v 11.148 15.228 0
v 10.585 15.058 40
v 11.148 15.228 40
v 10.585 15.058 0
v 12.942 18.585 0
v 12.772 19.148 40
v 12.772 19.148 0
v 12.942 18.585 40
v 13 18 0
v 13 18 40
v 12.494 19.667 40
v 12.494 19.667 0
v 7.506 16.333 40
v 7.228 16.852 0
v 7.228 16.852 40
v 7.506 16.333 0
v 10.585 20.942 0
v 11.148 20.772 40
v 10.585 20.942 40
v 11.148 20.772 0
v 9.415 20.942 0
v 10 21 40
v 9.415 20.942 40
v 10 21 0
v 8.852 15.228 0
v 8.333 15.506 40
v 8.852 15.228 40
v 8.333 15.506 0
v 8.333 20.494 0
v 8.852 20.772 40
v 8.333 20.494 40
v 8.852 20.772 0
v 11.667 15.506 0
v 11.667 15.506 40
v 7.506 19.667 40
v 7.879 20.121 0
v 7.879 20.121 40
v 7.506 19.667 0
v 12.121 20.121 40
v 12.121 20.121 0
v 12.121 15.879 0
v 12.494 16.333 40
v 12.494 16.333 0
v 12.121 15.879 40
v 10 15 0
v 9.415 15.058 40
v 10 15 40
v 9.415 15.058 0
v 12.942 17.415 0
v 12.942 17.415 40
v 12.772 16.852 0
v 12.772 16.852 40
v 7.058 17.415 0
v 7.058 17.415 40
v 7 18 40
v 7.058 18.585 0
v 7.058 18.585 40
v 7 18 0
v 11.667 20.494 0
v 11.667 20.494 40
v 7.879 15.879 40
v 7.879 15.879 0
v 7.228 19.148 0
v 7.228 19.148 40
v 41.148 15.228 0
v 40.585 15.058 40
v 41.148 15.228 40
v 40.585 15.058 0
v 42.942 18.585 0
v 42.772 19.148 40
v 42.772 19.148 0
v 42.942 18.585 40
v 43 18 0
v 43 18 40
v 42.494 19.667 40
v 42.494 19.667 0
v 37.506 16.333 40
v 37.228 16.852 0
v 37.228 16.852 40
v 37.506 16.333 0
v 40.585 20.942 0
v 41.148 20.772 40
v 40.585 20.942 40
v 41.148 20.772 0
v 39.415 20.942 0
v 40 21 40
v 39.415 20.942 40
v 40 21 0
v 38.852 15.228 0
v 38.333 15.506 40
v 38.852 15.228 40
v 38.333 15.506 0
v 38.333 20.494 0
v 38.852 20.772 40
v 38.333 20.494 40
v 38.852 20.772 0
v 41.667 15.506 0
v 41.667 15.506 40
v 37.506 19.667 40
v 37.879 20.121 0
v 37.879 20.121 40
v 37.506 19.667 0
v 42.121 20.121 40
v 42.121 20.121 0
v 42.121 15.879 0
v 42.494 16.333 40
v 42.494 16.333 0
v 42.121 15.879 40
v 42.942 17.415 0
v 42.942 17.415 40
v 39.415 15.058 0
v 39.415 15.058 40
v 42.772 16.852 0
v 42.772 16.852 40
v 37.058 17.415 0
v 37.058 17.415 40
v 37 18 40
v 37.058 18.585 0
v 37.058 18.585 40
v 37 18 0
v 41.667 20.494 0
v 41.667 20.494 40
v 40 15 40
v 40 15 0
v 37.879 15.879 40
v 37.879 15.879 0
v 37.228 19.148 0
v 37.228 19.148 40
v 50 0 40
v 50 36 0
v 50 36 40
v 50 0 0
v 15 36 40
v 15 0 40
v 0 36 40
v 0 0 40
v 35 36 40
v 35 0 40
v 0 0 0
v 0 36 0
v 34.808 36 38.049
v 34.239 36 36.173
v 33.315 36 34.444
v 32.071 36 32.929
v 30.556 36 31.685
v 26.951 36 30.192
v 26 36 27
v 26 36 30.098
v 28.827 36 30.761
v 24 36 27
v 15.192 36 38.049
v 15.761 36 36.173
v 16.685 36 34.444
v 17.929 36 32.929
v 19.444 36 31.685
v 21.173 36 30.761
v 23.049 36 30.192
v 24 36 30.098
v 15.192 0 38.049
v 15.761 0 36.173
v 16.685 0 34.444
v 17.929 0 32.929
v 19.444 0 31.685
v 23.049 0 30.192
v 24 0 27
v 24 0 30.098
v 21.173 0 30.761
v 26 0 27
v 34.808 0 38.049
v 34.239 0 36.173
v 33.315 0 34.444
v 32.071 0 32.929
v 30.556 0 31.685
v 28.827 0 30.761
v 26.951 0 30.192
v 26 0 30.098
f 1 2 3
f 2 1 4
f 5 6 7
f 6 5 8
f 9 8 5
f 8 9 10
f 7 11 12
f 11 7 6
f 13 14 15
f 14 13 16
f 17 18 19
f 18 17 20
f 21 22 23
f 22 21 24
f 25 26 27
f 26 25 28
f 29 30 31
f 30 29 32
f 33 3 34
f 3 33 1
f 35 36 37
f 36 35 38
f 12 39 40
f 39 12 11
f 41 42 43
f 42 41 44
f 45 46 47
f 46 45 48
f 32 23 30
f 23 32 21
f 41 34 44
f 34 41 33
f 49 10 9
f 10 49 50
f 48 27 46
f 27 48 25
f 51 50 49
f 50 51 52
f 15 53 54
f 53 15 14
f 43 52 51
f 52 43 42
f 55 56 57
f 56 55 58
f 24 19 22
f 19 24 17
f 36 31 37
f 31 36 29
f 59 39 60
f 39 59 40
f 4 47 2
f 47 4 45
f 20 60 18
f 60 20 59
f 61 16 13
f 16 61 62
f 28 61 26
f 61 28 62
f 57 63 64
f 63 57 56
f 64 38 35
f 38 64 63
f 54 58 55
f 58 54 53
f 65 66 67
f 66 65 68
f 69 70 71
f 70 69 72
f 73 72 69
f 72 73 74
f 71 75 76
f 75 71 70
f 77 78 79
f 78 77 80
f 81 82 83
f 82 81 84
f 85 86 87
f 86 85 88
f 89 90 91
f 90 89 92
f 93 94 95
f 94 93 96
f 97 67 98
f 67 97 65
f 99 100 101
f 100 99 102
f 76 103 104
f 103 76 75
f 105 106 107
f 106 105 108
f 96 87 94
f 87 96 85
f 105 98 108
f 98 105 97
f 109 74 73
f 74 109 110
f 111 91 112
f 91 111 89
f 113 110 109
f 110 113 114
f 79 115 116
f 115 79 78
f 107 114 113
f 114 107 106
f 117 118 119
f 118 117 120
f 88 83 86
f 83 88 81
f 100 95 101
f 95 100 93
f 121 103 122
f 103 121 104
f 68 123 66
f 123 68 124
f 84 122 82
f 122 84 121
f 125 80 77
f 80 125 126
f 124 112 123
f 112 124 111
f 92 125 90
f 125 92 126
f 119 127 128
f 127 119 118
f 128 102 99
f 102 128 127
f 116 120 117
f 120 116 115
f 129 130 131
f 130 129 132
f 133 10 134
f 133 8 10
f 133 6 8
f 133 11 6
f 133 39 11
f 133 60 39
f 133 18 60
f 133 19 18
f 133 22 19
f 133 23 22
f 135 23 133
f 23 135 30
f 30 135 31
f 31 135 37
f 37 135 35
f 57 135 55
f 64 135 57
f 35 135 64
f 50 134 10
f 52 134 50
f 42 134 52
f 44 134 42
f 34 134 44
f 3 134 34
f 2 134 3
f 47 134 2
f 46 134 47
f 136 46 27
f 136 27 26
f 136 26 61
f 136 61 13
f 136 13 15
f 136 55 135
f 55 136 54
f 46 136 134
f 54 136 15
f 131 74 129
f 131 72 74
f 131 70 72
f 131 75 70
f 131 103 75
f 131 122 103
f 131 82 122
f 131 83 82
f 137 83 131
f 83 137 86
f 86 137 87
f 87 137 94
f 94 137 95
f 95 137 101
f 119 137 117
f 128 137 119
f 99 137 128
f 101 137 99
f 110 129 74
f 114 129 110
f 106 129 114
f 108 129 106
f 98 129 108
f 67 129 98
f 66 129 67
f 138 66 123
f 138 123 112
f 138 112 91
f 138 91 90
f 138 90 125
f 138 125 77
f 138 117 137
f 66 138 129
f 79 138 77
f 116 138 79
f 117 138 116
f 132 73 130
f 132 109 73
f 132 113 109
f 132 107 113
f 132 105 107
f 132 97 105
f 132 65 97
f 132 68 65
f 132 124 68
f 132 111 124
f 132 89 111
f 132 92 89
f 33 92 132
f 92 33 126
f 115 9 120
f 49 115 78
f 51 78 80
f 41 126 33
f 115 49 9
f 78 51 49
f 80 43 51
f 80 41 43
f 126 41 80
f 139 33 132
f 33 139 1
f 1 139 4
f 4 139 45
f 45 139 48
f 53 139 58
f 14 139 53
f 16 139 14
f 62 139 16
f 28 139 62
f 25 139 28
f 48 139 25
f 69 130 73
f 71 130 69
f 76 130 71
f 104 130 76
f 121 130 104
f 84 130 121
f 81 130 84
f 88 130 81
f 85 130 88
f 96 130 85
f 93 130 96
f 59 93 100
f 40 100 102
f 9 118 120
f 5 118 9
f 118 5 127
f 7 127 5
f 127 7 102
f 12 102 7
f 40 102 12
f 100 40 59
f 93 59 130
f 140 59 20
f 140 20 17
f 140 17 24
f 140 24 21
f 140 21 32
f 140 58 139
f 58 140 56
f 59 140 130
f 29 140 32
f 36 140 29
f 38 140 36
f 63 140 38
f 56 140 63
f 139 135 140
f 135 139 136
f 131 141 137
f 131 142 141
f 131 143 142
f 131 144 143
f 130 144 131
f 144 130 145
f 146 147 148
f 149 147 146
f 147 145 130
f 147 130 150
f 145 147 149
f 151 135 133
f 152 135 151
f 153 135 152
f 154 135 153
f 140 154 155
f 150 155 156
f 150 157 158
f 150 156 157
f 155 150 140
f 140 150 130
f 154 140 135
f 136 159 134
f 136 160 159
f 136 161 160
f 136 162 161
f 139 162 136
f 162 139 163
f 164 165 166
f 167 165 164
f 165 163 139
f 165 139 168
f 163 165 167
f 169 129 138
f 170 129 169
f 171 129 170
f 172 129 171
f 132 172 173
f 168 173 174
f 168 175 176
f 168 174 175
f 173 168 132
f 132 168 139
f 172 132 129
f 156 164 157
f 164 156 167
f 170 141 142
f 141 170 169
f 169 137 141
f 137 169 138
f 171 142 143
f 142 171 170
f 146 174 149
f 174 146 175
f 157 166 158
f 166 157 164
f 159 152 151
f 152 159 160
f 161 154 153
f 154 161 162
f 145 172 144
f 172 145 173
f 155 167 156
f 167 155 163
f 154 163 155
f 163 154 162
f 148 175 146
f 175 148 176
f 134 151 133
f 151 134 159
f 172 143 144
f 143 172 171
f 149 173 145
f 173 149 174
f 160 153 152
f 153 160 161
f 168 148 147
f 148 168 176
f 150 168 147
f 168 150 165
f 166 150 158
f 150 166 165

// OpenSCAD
$fn = 32;

// ----------------------------------------------------------------------
// Saddle clamp: split shaft clamp
// ----------------------------------------------------------------------

// --- parameters (mm) ---
blk_l = 50;               // block length, X
blk_w = 36;               // block width, Y
blk_h = 40;               // block height
clamp_r = 10;             // shaft groove radius
hole_r = 3;               // bolt hole radius
hole_m = 10;              // bolt hole margin from the ends
saw_w = 2;                // saw kerf width
fit_tol = 0.02;           // tolerance for press fits, mm
free_tol = 0.2;           // tolerance for clearance fits, mm

saw_depth = clamp_r + 3;  // saw kerf depth

difference() {
  cube([blk_l, blk_w, blk_h]);
  translate([blk_l / 2, -1, blk_h])
    rotate([-90, 0, 0])
      cylinder(h = blk_w + 2, r = clamp_r);
  for (sx = [0, 1])
    translate([sx ? blk_l - hole_m : hole_m, blk_w / 2, -1])
      cylinder(r = hole_r, h = blk_h + 2);
  translate([blk_l / 2 - saw_w / 2, -1, blk_h - saw_depth])
    cube([saw_w, blk_w + 2, saw_depth + 1]);
}
